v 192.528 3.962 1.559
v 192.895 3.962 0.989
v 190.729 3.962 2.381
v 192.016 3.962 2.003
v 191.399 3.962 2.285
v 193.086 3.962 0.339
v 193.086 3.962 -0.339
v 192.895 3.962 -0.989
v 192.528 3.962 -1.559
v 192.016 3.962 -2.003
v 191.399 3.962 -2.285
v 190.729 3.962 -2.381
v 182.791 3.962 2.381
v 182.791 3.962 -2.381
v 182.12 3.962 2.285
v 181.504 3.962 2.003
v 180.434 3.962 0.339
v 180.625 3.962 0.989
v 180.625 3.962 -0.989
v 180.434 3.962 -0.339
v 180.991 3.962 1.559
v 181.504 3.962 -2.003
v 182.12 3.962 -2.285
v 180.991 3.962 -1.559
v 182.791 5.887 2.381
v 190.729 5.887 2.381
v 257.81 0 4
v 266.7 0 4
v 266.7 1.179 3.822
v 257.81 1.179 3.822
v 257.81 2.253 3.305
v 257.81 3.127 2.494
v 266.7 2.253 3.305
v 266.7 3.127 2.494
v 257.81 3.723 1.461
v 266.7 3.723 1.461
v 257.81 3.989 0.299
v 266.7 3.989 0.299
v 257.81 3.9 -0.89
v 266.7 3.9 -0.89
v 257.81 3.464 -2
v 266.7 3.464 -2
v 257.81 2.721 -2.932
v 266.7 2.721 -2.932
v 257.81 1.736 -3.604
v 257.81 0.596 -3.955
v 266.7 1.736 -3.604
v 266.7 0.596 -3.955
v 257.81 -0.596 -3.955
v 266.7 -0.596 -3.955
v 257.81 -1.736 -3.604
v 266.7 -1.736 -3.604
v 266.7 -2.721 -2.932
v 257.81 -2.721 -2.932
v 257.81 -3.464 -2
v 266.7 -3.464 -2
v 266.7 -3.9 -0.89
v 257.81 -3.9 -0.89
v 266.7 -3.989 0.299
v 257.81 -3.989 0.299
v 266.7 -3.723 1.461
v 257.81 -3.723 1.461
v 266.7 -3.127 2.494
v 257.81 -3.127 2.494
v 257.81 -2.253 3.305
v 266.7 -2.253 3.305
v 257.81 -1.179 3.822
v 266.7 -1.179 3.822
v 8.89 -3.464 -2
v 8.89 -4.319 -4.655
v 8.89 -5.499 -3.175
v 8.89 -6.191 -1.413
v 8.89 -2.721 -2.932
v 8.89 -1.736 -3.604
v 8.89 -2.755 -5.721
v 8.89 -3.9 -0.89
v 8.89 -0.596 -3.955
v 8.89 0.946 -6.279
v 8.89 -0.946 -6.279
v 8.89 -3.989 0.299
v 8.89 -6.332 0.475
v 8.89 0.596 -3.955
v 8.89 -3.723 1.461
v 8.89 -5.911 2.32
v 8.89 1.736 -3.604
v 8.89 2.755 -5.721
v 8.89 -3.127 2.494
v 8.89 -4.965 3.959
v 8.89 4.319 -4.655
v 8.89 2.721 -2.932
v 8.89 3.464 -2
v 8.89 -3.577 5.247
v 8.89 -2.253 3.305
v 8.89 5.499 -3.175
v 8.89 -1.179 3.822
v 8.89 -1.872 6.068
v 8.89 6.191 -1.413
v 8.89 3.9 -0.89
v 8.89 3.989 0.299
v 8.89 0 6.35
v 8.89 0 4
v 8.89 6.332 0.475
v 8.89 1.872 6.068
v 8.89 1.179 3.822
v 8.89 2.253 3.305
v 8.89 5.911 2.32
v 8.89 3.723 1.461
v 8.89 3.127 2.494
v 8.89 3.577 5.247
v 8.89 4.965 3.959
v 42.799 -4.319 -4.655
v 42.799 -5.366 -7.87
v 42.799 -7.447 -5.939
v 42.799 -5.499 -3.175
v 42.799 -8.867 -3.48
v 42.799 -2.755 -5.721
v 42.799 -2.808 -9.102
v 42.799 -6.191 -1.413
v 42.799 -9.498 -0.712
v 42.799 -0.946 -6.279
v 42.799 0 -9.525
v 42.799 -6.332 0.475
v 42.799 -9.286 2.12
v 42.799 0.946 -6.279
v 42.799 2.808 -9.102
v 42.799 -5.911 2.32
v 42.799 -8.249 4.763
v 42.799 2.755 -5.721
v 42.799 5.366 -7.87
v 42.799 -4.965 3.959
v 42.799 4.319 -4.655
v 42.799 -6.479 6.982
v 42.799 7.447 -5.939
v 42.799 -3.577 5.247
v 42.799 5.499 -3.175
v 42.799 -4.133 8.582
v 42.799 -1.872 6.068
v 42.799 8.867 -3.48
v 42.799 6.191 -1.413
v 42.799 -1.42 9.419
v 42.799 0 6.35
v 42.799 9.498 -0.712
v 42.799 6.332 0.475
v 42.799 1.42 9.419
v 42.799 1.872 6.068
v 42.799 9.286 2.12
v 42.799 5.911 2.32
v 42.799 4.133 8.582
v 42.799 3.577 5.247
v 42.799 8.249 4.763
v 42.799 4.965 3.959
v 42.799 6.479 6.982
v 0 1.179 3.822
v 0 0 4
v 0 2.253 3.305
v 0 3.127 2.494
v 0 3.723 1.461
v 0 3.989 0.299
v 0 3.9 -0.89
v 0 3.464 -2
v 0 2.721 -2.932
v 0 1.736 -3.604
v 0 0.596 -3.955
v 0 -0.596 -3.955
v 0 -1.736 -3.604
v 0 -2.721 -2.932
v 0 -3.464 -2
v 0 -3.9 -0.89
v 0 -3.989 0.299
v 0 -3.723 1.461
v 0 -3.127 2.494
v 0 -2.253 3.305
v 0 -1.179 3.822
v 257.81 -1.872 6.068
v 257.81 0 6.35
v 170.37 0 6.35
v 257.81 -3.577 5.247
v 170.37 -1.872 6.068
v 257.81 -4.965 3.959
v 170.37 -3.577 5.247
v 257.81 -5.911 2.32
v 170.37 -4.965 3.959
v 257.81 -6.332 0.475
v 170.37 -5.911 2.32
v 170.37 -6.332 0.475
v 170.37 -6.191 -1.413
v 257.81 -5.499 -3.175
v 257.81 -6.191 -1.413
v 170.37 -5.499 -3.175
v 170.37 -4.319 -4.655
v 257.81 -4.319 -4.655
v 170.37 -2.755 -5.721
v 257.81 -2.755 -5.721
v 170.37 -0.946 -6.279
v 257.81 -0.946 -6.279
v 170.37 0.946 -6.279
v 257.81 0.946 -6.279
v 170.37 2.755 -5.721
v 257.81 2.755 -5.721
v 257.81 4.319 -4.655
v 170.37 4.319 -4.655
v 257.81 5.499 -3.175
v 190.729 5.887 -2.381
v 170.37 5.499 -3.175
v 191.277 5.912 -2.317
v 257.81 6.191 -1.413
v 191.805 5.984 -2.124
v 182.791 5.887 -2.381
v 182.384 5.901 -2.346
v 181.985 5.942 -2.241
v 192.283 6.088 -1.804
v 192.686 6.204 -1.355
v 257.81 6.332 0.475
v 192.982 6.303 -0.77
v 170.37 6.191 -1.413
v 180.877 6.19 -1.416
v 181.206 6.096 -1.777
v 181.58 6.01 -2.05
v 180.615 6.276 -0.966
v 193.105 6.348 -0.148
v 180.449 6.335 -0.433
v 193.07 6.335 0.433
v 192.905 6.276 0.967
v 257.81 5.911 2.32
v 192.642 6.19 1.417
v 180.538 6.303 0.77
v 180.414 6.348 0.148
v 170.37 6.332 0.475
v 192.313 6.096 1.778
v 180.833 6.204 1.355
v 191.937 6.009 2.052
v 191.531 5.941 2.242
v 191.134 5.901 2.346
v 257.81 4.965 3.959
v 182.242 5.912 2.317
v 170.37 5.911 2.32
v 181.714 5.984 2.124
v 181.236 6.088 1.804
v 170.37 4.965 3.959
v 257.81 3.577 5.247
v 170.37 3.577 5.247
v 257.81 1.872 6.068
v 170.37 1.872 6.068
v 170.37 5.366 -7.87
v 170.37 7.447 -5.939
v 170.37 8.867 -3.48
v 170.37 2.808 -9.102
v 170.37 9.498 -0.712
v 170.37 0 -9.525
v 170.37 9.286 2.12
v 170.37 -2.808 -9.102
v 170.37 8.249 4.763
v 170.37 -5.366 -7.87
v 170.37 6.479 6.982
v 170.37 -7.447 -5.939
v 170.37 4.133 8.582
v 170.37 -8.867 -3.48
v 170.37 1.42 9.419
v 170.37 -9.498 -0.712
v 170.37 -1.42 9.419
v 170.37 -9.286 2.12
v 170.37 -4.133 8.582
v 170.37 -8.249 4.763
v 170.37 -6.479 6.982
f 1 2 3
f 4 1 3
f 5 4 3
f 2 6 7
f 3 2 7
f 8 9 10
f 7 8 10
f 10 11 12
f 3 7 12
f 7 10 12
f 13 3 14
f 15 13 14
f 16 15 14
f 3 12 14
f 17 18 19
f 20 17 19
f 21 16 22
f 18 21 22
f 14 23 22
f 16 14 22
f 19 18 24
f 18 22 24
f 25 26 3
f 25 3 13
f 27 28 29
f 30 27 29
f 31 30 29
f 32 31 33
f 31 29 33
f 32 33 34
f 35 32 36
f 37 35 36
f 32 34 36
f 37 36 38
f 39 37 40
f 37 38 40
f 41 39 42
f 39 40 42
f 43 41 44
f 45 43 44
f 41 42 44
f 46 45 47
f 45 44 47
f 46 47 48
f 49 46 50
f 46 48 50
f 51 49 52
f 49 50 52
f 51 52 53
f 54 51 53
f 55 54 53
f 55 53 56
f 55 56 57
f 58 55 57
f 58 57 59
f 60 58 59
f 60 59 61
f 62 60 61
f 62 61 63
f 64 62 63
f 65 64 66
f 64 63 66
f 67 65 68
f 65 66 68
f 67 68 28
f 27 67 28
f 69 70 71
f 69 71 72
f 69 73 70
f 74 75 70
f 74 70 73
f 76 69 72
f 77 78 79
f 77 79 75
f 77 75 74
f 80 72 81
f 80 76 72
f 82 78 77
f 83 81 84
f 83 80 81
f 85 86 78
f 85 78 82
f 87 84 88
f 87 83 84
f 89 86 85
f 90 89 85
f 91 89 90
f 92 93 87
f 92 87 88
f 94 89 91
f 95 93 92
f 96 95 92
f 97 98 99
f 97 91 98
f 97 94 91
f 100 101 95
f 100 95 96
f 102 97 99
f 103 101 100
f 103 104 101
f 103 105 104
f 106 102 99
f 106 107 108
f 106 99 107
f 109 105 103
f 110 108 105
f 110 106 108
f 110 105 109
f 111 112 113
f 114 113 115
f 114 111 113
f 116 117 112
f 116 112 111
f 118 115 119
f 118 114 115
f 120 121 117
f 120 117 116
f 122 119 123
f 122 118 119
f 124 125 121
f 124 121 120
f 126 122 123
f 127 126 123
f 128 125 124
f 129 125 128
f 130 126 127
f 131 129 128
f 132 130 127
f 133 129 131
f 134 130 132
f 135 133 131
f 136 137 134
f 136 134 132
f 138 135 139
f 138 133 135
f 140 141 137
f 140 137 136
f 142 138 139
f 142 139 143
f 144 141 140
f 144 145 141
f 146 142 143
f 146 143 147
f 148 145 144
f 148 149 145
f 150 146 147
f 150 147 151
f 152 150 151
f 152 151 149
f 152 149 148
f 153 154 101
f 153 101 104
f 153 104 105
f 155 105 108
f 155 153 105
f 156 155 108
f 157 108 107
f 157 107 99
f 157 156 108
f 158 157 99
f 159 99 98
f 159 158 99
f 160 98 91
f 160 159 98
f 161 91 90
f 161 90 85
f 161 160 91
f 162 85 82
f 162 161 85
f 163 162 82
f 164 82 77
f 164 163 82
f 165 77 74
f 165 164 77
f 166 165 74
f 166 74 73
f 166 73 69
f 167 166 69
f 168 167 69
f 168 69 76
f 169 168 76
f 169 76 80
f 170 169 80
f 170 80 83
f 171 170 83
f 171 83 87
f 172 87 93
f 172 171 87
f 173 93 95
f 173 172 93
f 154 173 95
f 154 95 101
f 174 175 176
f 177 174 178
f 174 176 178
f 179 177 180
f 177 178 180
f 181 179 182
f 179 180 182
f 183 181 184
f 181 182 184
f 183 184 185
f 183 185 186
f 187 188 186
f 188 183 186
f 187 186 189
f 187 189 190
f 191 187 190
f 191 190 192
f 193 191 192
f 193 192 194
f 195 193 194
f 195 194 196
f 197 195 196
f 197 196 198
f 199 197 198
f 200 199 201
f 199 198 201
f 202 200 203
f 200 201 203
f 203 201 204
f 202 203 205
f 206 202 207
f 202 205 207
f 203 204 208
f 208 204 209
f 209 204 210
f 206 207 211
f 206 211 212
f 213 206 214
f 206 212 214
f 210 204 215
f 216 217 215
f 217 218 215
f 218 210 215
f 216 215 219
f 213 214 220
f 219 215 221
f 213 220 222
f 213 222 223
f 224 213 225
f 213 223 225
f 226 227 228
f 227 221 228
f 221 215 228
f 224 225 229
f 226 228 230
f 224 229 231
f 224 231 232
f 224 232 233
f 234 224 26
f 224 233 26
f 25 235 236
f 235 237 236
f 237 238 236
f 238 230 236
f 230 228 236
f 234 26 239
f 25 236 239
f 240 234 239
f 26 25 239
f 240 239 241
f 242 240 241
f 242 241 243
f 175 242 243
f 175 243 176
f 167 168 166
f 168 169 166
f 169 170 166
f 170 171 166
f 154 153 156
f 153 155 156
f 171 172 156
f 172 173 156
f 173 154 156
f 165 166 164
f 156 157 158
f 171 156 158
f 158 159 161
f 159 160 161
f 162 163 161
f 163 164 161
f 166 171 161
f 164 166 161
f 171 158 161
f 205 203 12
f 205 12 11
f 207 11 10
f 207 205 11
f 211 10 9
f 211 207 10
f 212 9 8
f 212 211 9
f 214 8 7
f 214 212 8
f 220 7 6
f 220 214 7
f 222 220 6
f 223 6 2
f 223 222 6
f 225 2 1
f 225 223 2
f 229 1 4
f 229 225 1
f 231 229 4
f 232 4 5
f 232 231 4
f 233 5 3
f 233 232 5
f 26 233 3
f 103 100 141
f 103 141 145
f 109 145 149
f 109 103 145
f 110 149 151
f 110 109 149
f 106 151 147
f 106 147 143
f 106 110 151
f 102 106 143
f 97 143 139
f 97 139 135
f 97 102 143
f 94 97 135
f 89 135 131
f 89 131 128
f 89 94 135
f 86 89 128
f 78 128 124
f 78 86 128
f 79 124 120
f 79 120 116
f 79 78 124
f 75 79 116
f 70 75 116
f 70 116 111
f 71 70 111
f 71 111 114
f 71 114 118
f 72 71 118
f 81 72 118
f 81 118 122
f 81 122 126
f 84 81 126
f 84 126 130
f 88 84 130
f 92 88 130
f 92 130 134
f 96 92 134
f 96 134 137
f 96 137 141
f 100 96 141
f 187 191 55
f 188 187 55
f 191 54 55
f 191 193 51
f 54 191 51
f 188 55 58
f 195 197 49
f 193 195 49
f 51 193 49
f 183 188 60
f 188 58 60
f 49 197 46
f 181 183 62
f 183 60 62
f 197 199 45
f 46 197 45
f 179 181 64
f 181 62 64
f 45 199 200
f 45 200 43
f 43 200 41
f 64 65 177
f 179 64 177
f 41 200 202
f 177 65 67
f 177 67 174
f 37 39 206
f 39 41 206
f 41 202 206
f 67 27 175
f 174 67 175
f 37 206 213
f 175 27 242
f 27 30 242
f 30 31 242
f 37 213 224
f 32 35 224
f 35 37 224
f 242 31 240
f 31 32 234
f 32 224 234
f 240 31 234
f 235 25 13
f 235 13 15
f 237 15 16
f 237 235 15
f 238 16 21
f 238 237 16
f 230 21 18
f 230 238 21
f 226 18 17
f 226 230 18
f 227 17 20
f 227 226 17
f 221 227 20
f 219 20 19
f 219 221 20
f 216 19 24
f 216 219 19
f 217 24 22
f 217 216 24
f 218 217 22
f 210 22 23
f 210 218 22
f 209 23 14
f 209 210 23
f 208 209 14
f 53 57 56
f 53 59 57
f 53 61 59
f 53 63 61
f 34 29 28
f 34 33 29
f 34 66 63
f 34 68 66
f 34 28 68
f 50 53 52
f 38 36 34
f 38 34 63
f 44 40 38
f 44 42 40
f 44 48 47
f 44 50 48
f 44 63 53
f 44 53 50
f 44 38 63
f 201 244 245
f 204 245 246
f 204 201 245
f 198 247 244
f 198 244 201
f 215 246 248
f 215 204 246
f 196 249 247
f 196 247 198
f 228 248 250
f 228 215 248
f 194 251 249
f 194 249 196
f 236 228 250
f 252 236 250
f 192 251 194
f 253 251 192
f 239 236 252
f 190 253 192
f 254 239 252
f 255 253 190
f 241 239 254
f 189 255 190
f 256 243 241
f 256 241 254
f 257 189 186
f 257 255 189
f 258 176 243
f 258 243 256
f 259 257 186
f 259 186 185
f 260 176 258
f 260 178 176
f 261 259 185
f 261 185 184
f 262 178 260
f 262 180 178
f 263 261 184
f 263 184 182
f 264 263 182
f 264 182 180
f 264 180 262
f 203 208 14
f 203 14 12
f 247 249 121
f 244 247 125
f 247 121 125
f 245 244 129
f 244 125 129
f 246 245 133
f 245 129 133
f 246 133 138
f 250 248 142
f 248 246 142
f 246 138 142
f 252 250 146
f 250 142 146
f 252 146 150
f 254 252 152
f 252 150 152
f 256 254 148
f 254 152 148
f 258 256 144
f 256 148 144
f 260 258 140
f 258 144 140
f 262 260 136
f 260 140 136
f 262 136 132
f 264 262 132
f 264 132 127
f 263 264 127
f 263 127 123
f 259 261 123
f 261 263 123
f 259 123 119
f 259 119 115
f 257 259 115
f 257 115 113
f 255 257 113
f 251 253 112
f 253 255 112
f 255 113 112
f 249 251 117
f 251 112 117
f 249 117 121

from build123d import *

# Parameters (mm, degrees)
SKETCH1_R           = 9.525
BOSS_EXTRUDE1_DEPTH = 266.7
SKETCH4_R           = 9.525
SKETCH4_R_2         = 6.35
CUT_EXTRUDE3_DEPTH  = 42.799
SKETCH5_R           = 6.35
SKETCH5_R_2         = 4
CUT_EXTRUDE4_DEPTH  = 8.89
CUT_EXTRUDE5_START  = -96.3295
SKETCH6_R           = 9.525
SKETCH6_R_2         = 6.35
CUT_EXTRUDE5_DEPTH  = 96.3295
CUT_EXTRUDE6_DEPTH  = 2.3876


with BuildPart() as part:
    # Sketch1 → Boss-Extrude1 (new body)
    with BuildSketch(Plane(origin=(0, 0, 0), x_dir=(0, 0, -1), z_dir=(1, 0, 0))):
        Circle(SKETCH1_R)
    extrude(amount=BOSS_EXTRUDE1_DEPTH)

    # Sketch4 → Cut-Extrude3 (cut)
    with BuildSketch(Plane.ZY):
        Circle(SKETCH4_R)
        Circle(SKETCH4_R_2, mode=Mode.SUBTRACT)
    extrude(amount=-CUT_EXTRUDE3_DEPTH, mode=Mode.SUBTRACT)

    # Sketch5 → Cut-Extrude4 (cut)
    with BuildSketch(Plane.ZY):
        Circle(SKETCH5_R)
        Circle(SKETCH5_R_2, mode=Mode.SUBTRACT)
    cut_extrude4 = extrude(amount=-CUT_EXTRUDE4_DEPTH, mode=Mode.SUBTRACT)

    # Sketch6 → Cut-Extrude5 (cut)
    with BuildSketch(Plane(origin=(266.7, 0, 0), x_dir=(0, 0, -1), z_dir=(1, 0, 0)).offset(CUT_EXTRUDE5_START)):
        with Locations(Location((0, 0, 0), (0, 0, 180))):
            Circle(SKETCH6_R)
        with Locations(Location((0, 0, 0), (0, 0, 180))):
            Circle(SKETCH6_R_2, mode=Mode.SUBTRACT)
    extrude(amount=CUT_EXTRUDE5_DEPTH, mode=Mode.SUBTRACT)

    # Mirror1: Cut-Extrude4 across plane
    add(cut_extrude4.mirror(Plane.ZY.offset(-133.35)), mode=Mode.SUBTRACT)

    # Sketch7 → Cut-Extrude6 (cut)
    with BuildSketch(Plane(origin=(0, 6.35, 0), x_dir=(1, 0, 0), z_dir=(0, 1, 0))):
        with BuildLine():
            Line((182.7911, 2.38125), (190.7286, 2.38125))
            ThreePointArc((190.7286, 2.38125), (193.10985, 0), (190.7286, -2.38125))
            Line((190.7286, -2.38125), (182.7911, -2.38125))
            ThreePointArc((182.7911, -2.38125), (180.40985, 0), (182.7911, 2.38125))
        make_face()
    extrude(amount=-CUT_EXTRUDE6_DEPTH, mode=Mode.SUBTRACT)


solid = part.part
